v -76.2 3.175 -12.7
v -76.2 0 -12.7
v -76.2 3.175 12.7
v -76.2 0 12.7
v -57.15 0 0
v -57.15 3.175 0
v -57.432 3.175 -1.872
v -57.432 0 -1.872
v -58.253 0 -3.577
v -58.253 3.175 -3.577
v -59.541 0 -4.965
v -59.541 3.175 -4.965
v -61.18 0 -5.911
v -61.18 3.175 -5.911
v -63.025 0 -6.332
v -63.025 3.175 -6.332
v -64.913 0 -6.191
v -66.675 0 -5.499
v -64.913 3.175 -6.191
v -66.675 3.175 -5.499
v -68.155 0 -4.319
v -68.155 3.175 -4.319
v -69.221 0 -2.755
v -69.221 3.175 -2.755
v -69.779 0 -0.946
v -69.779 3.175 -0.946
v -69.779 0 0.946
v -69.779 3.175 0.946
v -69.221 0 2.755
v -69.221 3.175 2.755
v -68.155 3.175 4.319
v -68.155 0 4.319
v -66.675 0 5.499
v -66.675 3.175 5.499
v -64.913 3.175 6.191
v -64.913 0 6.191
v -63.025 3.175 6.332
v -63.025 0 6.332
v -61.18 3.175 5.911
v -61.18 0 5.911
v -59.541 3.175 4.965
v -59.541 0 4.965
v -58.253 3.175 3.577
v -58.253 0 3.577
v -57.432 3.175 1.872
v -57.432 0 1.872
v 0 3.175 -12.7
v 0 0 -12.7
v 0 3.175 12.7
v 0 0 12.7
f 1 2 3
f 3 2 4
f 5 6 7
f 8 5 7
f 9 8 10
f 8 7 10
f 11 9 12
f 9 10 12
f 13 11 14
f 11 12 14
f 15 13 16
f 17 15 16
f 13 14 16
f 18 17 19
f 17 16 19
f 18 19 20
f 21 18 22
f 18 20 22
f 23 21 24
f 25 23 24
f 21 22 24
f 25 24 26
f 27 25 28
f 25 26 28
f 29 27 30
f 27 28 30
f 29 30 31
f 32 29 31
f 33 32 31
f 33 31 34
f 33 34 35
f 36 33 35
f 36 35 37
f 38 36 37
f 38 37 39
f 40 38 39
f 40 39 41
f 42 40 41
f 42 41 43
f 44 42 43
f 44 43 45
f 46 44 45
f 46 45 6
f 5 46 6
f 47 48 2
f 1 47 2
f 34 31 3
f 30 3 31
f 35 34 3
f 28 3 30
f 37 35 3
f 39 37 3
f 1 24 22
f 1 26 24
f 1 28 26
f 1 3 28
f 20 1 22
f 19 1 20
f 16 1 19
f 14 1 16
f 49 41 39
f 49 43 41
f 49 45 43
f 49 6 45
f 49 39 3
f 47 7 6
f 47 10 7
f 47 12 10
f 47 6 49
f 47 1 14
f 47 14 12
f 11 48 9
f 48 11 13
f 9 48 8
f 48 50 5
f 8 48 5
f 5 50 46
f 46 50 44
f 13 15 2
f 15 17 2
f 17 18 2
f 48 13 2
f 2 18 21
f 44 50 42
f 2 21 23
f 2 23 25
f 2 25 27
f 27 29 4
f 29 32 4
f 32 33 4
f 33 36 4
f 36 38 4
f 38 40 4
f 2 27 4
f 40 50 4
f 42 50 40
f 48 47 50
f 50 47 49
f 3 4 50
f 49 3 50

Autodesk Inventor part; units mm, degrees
ref_plane "YZ Plane" through (0, 0, 0) normal (1, 0, 0) x (0, 1, 0)
ref_plane "XZ Plane" through (0, 0, 0) normal (0, 1, 0) x (-1, 0, 0)
ref_plane "XY Plane" through (0, 0, 0) normal (0, 0, 1) x (1, 0, 0)
sketch "Sketch1" plane through (0, 0, 0) normal (0, 1, 0) x (-1, 0, 0)
  line L0 (-76.2, -12.7) -> (76.2, -12.7)
  line L1 (76.2, -12.7) -> (76.2, 12.7)
  line L2 (76.2, 12.7) -> (-76.2, 12.7)
  line L3 (-76.2, 12.7) -> (-76.2, -12.7)
  line L4 (-76.2, -12.7) -> (76.2, 12.7) construction
  line L5 (76.2, -12.7) -> (-76.2, 12.7) construction
  line L6 (-76.2, 0) -> (-63.5, 0)
  line L7 (-76.2, 0) -> (-63.5, 0) construction
  line L8 (76.2, 0) -> (50.8, 0)
  line L9 (76.2, 0) -> (101.6, 0) construction
  line L10 (50.8, 0) -> (25.4, 0)
  circle A0 centre (-63.5, 0) radius 3.175
  circle A1 centre (25.4, 0) radius 3.175
  point P0 (0, 0)
  dimension "d0" = 152.4
  dimension "d1" = 25.4
  dimension "d2" = 12.7
  dimension "d3" = 0
  dimension "d4" = 25.4
  dimension "d5" = 180
  dimension "d6" = 25.4
  dimension "d7" = 6.35
  dimension "d8" = 6.35
extrude "Extrusion1" add sketch "Sketch1" along normal blind 3.175
sketch "Sketch2" plane through (0, 3.175, 0) normal (0, 1, 0) x (1, 0, 0)
  circle A0 centre (-63.5, 0) radius 3.175
  point P0 (0, 0)
  dimension "d11" = 6.35
extrude "Extrusion2" cut sketch "Sketch2" against normal blind 25.4
sketch "Sketch3" plane through (0, 3.175, 0) normal (0, 1, 0) x (1, 0, 0)
  circle A0 centre (-63.5, 0) radius 3.175 projected
  circle A1 centre (-63.5, 0) radius 6.35
  point P0 (0, 0)
  dimension "d14" = 12.7
extrude "Extrusion3" cut sketch "Sketch3" against normal blind 25.4
sketch "Sketch4" plane through (0, 3.175, 0) normal (0, 1, 0) x (1, 0, 0)
  circle A0 centre (63.5, 0) radius 3.175 projected
  line L0 (76.2, 12.7) -> (-76.2, 12.7) projected
  line L1 (-76.2, -12.7) -> (76.2, -12.7) projected
  line L2 (76.2, -12.7) -> (76.2, 12.7) projected
  line L3 (0, 12.7) -> (0, -12.7)
  point P0 (0, 0)
extrude "Extrusion4" cut sketch "Sketch4" against normal blind 25.4
sketch "Sketch5" plane through (0, 3.175, 0) normal (0, 1, 0) x (1, 0, 0)
  circle A0 centre (-25.4, 0) radius 3.175 projected
  circle A1 centre (-25.4, 0) radius 3.175
  point P0 (0, 0)
extrude "Extrusion5" add sketch "Sketch5" against normal blind 3.175
properties part number "BarHolder"
